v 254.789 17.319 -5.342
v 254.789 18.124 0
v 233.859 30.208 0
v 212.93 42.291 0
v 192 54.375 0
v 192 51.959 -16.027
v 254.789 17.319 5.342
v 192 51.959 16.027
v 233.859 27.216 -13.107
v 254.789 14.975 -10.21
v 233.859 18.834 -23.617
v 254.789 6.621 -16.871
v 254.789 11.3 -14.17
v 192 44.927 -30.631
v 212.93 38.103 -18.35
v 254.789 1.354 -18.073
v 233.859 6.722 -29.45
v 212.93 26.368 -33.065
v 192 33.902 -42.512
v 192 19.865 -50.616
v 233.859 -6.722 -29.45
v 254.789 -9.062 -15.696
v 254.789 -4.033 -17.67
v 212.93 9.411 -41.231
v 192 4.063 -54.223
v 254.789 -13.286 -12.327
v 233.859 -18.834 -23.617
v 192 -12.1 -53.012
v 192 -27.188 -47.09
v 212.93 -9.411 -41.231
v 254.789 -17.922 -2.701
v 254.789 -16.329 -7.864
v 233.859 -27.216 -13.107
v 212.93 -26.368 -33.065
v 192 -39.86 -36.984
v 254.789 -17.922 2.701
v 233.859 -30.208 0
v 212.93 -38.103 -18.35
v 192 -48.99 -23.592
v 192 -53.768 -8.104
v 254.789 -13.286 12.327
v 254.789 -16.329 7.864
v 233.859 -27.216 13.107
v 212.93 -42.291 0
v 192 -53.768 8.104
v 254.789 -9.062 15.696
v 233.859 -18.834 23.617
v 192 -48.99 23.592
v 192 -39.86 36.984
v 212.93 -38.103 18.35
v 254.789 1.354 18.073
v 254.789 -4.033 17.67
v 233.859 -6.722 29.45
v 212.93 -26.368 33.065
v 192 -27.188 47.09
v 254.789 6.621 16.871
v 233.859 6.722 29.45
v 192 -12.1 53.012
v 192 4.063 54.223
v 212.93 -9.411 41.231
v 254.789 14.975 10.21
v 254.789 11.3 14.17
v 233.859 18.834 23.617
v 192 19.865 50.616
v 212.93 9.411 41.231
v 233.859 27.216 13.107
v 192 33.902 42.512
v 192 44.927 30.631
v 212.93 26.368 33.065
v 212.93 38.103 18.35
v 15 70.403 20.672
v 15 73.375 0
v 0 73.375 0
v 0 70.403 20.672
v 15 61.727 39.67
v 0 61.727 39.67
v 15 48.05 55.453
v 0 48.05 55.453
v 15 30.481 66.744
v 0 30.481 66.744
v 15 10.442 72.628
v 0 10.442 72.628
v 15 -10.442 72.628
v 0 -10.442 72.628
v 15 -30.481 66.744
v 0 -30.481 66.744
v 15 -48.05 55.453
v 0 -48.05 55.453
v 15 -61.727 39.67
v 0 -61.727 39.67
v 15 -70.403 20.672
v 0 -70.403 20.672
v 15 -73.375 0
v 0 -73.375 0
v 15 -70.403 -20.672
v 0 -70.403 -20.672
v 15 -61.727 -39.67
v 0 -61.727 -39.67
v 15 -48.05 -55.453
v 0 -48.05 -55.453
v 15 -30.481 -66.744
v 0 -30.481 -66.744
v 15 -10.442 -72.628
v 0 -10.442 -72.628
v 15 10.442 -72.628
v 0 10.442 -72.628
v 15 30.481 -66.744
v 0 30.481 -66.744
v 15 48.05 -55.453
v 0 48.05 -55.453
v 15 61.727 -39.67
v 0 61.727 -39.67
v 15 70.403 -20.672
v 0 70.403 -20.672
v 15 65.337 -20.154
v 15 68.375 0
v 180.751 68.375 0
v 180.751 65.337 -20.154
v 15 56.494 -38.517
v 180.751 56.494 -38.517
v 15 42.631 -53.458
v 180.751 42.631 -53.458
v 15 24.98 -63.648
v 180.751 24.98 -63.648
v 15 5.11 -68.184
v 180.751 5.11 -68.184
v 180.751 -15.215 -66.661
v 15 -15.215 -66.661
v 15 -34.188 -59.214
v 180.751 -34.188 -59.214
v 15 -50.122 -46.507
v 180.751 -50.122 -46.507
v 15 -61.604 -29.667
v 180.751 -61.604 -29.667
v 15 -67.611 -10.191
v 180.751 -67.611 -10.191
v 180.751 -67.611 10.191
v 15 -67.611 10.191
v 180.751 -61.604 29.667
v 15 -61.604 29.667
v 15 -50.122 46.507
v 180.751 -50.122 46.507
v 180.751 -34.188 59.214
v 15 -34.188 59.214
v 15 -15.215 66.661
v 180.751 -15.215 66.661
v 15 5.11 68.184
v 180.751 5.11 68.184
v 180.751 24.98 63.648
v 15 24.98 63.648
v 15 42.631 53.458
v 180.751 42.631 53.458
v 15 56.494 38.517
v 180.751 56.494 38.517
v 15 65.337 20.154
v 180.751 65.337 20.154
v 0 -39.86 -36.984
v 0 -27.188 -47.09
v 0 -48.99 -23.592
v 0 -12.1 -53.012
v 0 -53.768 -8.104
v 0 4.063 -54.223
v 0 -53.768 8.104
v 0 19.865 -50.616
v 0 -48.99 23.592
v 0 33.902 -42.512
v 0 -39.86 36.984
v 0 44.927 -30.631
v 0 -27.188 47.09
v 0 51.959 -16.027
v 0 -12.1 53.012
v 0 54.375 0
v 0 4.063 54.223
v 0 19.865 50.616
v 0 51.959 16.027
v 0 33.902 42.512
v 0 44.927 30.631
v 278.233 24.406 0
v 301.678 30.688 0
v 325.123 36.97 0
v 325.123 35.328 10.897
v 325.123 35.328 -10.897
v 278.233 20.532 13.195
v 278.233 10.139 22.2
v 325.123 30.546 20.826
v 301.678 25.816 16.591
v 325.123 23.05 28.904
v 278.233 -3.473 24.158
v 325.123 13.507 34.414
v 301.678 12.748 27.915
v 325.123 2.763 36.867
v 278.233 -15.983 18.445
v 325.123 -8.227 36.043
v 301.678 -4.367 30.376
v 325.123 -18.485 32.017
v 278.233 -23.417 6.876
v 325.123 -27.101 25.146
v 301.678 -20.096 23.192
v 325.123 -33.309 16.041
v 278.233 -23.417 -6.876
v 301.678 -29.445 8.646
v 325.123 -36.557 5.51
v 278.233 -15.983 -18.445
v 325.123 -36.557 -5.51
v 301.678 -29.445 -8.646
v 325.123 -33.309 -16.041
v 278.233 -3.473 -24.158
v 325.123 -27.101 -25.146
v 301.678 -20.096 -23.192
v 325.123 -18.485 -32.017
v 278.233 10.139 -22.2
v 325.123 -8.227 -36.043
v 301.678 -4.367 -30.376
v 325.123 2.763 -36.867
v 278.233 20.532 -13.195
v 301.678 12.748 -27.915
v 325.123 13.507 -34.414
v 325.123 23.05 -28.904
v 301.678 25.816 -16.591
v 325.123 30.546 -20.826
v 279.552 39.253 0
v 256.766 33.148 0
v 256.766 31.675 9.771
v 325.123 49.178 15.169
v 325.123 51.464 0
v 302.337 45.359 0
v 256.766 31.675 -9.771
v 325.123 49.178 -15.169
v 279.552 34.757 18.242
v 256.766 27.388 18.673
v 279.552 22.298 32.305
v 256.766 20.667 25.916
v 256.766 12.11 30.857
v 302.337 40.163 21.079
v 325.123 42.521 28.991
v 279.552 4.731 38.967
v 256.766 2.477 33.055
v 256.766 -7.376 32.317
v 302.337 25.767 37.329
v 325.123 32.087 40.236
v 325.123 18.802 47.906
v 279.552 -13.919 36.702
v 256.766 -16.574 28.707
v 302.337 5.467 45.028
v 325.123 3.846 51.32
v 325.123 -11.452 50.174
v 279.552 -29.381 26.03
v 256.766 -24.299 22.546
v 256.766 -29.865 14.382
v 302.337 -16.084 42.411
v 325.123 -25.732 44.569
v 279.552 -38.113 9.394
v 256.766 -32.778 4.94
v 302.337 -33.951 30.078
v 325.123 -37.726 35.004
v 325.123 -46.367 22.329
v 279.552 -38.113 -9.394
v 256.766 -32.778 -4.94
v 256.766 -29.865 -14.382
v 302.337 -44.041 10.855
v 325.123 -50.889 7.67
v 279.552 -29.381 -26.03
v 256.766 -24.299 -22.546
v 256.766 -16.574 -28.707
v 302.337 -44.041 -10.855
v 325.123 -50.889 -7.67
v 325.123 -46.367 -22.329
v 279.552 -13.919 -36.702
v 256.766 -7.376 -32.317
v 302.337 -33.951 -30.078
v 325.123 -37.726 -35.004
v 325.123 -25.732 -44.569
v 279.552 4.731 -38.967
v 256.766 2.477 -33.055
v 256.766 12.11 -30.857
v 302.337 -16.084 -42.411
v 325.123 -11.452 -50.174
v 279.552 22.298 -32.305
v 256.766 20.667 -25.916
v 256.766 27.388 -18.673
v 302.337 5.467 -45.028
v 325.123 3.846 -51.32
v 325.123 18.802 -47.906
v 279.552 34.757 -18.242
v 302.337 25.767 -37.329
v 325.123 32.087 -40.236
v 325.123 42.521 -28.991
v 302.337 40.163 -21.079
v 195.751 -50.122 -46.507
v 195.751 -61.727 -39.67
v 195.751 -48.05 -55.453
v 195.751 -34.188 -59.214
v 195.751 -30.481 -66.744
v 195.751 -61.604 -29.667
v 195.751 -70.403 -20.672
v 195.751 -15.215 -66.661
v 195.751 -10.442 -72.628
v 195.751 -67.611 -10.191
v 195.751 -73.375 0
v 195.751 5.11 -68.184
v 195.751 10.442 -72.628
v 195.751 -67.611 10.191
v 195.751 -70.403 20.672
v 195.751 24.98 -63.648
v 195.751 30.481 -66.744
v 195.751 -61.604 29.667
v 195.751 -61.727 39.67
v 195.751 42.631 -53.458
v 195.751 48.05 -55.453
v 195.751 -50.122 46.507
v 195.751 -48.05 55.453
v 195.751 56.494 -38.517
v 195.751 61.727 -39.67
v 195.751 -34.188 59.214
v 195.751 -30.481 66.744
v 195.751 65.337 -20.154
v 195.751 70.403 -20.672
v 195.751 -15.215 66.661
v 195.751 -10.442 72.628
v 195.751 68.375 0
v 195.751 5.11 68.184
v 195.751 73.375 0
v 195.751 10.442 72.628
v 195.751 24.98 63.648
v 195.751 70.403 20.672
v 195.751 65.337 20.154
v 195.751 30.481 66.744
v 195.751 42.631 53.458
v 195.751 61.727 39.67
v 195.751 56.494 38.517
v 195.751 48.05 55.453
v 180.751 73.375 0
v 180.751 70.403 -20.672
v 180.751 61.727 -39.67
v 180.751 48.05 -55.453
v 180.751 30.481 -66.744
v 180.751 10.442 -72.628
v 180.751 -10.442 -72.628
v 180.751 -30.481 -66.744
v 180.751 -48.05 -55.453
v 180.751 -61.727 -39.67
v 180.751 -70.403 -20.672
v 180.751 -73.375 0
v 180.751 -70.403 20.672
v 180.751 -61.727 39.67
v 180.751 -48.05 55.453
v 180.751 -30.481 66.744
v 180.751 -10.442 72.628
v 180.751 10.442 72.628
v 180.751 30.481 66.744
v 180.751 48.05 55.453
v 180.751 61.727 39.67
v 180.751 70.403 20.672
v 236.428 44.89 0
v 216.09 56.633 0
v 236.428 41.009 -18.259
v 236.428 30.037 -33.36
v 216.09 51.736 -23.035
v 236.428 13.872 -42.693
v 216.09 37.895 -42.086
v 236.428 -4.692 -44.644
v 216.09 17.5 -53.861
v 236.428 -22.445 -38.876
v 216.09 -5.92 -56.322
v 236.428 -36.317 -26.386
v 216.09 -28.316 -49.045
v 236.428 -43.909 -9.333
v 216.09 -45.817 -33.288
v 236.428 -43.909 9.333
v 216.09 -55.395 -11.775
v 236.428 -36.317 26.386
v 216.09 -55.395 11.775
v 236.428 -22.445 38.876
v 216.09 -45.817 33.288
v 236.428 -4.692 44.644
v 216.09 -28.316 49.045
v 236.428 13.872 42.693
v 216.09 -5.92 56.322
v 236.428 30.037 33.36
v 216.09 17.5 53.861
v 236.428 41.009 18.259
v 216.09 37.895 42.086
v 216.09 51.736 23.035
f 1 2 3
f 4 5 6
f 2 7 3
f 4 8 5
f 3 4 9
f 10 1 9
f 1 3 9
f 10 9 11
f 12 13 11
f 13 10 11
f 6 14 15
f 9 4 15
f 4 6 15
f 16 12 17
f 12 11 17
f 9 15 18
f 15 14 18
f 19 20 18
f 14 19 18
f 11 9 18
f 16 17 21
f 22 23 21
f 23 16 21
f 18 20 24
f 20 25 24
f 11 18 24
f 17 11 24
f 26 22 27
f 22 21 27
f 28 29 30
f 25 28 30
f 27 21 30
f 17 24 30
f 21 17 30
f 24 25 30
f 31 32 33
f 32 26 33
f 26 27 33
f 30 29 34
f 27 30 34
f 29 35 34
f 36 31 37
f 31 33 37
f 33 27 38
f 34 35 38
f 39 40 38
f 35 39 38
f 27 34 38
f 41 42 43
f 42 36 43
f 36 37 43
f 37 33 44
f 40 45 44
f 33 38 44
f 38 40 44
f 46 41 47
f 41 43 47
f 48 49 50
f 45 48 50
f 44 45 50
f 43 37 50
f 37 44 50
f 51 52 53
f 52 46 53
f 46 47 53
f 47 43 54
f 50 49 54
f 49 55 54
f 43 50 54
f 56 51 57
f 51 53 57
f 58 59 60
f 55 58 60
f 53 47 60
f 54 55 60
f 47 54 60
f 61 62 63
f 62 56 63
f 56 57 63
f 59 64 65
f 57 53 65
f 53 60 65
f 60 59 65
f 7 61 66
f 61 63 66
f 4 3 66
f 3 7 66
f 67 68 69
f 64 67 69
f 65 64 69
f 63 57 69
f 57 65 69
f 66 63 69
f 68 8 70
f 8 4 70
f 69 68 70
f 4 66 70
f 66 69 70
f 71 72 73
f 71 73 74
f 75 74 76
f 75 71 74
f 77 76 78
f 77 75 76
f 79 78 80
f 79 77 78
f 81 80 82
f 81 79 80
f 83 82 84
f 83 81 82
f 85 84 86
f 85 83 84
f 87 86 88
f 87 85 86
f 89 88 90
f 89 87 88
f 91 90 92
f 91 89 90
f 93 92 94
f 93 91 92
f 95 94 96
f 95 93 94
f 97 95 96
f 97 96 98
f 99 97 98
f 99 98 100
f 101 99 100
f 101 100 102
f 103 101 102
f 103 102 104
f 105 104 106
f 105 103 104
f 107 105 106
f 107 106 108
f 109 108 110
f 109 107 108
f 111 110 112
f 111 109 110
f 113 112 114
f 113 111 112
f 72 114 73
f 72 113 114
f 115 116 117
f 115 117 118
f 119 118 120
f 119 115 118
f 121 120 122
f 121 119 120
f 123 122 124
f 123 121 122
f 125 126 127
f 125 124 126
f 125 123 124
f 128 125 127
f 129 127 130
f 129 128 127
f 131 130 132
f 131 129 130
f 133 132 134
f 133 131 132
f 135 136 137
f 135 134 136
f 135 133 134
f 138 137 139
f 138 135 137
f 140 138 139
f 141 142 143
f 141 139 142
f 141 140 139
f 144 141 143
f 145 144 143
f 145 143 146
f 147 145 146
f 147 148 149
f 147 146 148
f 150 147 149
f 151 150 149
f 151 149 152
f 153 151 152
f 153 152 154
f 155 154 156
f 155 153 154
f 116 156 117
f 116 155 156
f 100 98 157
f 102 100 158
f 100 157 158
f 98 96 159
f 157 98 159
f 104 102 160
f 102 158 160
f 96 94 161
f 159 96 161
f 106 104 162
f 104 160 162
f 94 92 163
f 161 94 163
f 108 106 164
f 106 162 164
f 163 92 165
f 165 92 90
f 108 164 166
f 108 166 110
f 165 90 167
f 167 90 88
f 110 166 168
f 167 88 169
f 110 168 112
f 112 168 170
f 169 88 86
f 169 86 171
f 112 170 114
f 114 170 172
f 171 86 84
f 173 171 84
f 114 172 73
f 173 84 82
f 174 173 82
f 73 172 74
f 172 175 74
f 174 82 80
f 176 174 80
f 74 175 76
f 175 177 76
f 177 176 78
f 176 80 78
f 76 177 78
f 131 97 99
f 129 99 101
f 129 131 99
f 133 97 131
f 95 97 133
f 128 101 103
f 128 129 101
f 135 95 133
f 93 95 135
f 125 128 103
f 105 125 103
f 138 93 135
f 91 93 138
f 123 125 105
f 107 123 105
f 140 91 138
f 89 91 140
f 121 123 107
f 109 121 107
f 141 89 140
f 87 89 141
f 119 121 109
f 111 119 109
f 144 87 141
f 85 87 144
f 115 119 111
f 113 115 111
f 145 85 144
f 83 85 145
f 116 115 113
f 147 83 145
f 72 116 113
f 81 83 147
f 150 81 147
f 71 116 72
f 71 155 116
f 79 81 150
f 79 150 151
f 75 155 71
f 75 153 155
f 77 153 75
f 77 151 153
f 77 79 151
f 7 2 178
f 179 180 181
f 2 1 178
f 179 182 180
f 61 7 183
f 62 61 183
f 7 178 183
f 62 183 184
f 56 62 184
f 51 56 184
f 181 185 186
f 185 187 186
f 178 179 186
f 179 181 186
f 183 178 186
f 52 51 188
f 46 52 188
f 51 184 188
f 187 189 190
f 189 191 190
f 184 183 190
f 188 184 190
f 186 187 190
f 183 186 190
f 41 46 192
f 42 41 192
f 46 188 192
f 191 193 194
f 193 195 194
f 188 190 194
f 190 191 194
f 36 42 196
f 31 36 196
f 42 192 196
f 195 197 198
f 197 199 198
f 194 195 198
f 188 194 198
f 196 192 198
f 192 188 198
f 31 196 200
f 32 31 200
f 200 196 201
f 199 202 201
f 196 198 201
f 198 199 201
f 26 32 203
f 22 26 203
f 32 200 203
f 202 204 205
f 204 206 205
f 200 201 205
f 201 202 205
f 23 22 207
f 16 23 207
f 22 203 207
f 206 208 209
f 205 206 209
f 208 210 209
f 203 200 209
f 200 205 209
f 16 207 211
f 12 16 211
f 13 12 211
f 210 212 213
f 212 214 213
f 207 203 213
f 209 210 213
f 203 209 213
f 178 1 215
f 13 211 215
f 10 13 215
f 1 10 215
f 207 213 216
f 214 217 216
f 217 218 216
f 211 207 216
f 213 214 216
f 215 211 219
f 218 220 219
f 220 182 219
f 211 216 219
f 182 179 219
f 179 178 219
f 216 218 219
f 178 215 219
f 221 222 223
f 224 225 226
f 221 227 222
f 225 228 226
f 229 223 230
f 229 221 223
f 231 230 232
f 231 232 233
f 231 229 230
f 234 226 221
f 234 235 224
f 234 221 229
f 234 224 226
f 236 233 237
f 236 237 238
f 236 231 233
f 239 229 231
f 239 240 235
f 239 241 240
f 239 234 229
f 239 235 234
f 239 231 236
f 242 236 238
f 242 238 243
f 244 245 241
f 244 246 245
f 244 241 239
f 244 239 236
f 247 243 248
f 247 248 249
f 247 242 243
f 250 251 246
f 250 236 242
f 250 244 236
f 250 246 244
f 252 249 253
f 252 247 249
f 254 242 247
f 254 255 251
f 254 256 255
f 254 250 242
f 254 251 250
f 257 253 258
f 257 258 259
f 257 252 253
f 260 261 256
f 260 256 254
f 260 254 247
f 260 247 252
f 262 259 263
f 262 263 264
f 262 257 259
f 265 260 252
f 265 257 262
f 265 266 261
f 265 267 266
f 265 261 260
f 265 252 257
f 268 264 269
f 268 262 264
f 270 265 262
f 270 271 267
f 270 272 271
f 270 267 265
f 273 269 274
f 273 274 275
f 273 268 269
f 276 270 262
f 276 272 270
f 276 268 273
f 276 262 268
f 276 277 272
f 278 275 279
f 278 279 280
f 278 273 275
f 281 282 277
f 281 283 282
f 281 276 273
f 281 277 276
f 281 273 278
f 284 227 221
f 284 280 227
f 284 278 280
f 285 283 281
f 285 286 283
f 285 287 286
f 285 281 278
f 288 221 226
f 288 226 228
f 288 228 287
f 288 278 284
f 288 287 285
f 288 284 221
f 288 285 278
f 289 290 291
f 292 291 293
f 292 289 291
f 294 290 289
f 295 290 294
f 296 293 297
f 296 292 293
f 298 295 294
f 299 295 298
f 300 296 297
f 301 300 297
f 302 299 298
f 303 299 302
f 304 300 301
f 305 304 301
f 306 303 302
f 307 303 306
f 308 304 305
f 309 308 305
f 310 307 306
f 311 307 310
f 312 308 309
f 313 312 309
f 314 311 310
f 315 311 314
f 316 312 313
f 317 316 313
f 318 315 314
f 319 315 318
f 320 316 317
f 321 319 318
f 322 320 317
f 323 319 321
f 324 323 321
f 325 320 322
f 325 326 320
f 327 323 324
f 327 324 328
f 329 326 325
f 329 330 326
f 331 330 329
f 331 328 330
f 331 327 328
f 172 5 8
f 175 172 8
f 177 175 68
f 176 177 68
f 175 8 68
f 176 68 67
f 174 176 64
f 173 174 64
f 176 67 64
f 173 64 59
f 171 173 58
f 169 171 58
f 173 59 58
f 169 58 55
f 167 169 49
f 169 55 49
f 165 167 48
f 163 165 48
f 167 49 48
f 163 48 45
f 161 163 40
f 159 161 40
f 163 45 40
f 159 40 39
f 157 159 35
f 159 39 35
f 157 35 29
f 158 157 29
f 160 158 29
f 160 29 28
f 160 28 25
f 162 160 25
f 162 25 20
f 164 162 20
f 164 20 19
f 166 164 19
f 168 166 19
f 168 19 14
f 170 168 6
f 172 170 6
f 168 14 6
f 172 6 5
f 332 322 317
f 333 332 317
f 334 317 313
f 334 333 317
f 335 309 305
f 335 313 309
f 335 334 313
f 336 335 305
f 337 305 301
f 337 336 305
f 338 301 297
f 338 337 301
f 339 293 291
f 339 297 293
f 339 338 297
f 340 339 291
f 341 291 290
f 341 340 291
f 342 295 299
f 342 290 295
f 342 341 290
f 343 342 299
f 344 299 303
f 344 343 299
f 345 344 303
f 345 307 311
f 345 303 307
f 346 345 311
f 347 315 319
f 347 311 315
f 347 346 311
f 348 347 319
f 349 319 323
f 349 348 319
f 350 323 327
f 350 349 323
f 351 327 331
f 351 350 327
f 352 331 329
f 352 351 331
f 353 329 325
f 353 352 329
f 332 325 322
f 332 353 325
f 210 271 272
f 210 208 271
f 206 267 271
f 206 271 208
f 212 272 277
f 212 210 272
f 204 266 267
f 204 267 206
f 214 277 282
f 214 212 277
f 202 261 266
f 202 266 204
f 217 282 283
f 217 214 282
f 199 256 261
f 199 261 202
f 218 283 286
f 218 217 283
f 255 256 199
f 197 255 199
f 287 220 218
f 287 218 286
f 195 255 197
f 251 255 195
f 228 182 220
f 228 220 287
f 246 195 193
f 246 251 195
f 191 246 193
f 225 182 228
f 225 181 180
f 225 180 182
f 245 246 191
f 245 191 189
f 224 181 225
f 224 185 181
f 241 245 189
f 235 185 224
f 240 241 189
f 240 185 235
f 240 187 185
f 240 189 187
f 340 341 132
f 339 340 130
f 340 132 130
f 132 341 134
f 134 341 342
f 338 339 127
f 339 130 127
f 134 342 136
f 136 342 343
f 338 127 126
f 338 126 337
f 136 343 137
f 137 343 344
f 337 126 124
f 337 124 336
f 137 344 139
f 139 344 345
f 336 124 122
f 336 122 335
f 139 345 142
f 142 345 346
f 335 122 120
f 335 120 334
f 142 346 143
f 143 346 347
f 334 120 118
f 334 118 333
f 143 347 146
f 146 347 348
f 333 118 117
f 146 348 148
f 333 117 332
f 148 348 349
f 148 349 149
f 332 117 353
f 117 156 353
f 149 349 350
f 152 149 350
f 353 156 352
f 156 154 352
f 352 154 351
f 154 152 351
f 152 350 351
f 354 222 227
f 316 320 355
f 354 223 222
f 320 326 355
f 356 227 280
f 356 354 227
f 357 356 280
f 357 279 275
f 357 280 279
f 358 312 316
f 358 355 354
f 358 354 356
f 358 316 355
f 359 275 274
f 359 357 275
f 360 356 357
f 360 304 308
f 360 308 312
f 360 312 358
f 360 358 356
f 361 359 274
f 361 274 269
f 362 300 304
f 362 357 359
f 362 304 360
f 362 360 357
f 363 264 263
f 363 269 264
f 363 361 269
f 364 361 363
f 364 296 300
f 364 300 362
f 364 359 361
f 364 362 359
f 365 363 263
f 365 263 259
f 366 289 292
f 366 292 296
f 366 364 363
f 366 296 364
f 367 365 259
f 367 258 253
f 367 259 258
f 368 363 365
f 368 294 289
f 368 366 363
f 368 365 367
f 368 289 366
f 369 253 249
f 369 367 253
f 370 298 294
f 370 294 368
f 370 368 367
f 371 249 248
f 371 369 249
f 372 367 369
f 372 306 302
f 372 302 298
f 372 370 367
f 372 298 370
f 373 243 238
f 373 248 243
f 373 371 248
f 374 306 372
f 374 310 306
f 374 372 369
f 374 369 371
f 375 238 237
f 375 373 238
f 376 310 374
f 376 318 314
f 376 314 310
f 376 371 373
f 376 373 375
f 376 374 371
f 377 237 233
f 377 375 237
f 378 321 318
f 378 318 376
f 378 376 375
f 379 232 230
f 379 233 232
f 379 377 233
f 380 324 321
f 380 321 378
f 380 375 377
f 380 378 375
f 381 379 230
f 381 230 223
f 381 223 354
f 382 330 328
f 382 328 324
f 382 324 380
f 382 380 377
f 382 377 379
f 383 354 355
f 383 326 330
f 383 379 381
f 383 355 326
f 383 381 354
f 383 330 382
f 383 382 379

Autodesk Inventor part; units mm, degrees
ref_plane "YZ Plane" through (0, 0, 0) normal (1, 0, 0) x (0, 1, 0)
ref_plane "XZ Plane" through (0, 0, 0) normal (0, 1, 0) x (-1, 0, 0)
ref_plane "XY Plane" through (0, 0, 0) normal (0, 0, 1) x (1, 0, 0)
sketch "Sketch1" plane through (0, 0, 0) normal (0, 0, 1) x (1, 0, 0)
  line L0 (0, 0) -> (0, 54.375) construction
  line L1 (0, 54.375) -> (192, 54.375)
  line L2 (0, 0) -> (524.135, 0)
  line L3 (254.7886, 18.124) -> (254.7886, 0) construction
  line L4 (192, 54.375) -> (254.7886, 18.124)
  line L5 (254.7886, 18.124) -> (325.1228, 36.97)
  line L6 (325.1228, 36.97) -> (325.1228, 0) construction
  line L7 (192, 54.375) -> (192, 0) construction
  line L8 (325.1228, 51.4639) -> (256.7665, 33.1479)
  line L9 (256.7665, 33.1479) -> (195.7513, 68.375)
  line L10 (195.7513, 68.375) -> (0, 68.375)
  line L11 (0, 54.375) -> (0, 68.375)
  line L12 (325.1228, 36.97) -> (325.1228, 51.4639)
  line L13 (0, 68.375) -> (0, 73.375)
  line L14 (0, 73.375) -> (15, 73.375)
  line L15 (15, 73.375) -> (15, 68.375)
  line L16 (195.7513, 68.375) -> (195.7513, 73.375)
  line L17 (195.7513, 73.375) -> (180.7513, 73.375)
  line L18 (180.7513, 73.375) -> (180.7513, 68.375)
  dimension "d0" = 54.375
  dimension "d1" = 192
  dimension "d2" = 18.124
  dimension "d3" = 30
  dimension "d4" = 15
  dimension "d5" = 36.97
  dimension "d6" = 14
  dimension "d8" = 5
  dimension "d9" = 15
  dimension "d10" = 5
  dimension "d11" = 15
revolve "Revolution1" add sketch "Sketch1" angle 360 about axis through (0, 0, 0) along (1, 0, 0)
sketch "Sketch2" plane through (0, 0, 0) normal (-1, 0, 0) x (0, 0, 1)
  point P0 (0, 0)
properties part number "concept 2"
